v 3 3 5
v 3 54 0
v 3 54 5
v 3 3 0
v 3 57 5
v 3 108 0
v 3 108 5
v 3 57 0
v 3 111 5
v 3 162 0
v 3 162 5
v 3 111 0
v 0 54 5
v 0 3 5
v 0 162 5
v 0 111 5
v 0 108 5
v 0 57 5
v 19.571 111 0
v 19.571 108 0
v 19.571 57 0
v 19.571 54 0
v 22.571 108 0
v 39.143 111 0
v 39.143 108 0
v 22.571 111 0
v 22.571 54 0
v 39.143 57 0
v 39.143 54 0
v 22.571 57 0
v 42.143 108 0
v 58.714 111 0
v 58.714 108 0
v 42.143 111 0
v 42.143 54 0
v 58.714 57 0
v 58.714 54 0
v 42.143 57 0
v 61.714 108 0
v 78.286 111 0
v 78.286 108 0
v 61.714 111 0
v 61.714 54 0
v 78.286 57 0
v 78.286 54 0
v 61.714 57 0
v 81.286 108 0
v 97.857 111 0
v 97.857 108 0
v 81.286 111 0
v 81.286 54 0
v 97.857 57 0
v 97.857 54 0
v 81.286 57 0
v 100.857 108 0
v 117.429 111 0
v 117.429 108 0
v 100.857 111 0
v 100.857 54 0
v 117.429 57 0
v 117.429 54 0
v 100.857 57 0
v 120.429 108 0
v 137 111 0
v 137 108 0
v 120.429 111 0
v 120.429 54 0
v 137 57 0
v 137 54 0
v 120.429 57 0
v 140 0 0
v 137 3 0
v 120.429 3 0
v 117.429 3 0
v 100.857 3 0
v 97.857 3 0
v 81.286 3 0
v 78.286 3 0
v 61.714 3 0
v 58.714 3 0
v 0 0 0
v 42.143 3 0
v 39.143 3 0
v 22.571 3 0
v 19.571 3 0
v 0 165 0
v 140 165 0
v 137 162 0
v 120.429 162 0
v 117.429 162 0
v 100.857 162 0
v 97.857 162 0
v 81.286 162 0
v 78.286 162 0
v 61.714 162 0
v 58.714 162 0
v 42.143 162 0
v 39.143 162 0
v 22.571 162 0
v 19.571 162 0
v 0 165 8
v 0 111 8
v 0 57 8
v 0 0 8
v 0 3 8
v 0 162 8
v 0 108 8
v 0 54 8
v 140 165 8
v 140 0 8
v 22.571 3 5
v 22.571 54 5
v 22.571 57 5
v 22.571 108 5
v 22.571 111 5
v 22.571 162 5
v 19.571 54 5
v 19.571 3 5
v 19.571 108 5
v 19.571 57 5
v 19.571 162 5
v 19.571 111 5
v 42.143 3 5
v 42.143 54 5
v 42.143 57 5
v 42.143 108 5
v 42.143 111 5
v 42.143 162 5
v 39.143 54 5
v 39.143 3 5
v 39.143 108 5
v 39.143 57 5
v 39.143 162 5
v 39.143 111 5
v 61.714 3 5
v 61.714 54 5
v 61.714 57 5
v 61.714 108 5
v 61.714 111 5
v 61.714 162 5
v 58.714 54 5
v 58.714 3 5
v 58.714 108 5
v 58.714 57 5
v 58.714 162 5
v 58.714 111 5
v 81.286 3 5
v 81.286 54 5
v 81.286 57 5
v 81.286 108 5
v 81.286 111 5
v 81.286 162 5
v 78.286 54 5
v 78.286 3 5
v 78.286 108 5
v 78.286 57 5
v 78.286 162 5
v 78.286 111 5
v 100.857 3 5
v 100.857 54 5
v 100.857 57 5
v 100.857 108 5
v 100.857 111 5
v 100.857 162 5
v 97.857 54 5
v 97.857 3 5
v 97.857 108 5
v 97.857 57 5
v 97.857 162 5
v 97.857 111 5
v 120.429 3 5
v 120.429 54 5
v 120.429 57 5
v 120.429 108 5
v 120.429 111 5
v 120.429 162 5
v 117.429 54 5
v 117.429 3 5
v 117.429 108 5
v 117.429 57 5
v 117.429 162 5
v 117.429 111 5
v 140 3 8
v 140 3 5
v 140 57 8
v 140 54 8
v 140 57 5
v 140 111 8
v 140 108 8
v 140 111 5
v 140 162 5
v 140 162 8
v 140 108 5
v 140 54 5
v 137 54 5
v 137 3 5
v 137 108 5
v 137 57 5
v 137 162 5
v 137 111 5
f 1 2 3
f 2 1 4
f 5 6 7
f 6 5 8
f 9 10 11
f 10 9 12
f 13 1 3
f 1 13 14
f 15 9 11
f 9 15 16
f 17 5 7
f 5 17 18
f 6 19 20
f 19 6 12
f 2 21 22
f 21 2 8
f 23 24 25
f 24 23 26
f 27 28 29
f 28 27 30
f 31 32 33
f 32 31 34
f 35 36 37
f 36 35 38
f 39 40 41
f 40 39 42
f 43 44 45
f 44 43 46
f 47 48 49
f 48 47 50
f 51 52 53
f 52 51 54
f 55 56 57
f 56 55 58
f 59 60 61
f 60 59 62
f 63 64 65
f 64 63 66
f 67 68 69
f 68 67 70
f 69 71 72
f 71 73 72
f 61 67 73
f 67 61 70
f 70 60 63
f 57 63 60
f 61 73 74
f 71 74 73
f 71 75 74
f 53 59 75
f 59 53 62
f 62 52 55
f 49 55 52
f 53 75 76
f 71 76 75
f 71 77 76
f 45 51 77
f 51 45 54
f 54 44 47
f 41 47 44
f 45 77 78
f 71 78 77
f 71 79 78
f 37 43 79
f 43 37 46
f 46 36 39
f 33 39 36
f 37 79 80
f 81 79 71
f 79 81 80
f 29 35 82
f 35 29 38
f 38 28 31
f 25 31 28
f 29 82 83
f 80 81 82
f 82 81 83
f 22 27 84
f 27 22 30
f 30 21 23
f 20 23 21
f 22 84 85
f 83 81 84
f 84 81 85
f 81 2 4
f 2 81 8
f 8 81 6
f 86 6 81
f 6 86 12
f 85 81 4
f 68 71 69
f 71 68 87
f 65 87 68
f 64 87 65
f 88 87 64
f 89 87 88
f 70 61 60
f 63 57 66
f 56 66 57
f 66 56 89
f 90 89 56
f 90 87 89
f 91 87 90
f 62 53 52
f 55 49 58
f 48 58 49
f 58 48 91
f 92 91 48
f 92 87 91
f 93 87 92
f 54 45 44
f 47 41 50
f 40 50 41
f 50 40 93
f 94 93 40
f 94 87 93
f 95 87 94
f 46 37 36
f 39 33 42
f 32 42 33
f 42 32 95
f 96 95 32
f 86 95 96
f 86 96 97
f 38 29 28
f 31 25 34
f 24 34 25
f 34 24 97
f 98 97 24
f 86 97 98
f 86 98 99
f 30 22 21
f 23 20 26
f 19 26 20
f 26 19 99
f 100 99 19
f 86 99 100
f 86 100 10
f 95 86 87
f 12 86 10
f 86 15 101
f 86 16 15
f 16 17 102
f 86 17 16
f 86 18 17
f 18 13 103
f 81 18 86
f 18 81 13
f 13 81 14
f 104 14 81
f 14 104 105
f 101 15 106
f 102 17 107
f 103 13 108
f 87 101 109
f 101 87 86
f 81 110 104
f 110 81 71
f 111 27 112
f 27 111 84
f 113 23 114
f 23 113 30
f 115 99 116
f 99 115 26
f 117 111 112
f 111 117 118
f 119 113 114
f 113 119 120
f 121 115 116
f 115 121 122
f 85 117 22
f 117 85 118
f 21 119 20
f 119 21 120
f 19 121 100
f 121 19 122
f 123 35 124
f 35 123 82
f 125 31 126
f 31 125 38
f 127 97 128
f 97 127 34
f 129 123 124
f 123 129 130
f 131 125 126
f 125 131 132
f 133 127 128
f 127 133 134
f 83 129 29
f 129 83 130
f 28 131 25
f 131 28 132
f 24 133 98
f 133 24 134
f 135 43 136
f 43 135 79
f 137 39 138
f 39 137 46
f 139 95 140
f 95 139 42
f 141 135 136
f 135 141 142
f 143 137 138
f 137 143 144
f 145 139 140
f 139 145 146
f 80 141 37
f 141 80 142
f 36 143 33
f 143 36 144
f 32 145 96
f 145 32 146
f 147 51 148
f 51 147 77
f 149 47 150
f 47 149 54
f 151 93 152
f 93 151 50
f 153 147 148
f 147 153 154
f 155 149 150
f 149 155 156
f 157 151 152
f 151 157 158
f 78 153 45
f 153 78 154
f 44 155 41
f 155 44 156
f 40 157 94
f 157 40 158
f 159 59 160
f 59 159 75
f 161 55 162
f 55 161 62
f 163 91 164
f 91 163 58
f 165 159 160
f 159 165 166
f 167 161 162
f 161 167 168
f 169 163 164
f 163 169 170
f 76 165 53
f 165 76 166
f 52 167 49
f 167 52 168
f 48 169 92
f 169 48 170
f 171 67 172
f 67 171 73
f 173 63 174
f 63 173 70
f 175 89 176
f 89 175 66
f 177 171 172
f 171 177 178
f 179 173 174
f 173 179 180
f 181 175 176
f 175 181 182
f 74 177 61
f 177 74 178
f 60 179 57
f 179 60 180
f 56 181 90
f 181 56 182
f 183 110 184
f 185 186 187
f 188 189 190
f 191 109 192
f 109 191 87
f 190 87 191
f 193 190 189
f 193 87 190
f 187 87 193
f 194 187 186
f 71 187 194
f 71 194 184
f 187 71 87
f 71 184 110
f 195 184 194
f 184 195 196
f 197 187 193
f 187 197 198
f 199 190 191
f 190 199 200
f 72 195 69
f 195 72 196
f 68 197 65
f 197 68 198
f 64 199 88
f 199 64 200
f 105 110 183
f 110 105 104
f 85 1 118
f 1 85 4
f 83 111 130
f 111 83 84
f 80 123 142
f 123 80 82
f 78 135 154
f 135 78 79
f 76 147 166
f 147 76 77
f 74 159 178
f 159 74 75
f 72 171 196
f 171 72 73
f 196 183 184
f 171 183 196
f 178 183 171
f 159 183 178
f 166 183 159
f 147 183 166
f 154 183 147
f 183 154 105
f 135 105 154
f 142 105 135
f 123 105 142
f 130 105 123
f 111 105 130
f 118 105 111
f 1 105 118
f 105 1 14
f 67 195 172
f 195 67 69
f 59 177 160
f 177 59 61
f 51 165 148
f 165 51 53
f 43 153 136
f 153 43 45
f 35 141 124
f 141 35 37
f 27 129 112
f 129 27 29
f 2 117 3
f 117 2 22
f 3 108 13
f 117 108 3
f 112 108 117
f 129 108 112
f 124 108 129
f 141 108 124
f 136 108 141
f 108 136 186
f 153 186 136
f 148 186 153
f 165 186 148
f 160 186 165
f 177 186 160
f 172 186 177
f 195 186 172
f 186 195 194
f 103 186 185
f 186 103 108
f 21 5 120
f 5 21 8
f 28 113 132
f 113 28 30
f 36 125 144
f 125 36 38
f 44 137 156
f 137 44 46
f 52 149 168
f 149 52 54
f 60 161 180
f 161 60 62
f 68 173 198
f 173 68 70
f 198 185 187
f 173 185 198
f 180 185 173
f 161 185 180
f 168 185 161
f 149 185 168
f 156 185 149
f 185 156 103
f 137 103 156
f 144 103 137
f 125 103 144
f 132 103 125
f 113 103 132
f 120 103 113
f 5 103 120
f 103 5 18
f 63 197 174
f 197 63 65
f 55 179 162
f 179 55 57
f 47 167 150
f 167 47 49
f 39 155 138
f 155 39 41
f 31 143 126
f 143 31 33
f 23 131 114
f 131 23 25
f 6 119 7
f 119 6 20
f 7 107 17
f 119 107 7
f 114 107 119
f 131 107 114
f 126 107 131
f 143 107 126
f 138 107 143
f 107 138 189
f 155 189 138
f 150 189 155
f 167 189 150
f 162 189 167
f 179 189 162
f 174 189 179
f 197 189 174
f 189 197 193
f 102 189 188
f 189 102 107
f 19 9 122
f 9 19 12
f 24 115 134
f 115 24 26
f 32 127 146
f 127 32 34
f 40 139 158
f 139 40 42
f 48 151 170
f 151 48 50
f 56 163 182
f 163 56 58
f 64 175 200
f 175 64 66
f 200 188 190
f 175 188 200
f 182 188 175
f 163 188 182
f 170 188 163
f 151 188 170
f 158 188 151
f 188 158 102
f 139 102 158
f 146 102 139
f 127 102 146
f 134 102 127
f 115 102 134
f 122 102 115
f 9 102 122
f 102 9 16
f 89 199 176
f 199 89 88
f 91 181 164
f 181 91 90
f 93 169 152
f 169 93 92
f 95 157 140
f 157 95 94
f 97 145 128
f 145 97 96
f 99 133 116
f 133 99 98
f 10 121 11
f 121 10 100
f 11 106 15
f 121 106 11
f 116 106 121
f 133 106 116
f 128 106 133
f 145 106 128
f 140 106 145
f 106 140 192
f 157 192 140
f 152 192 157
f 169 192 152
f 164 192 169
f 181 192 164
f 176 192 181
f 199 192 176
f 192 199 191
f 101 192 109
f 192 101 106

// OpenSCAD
// Short shelf/rack thing (keeps veggies out of standing water from our annoying fridge internal leaking)

module grid(lenx=140, nx=8, leny=165, ny=4) {
  width = 3;
  height = 5;
  
  for (i = [0 : nx - 1]) {
    translate([(lenx - width) * i / (nx - 1), 0, 0])
      cube([width, leny, height]);
  }
  
  for (i = [0 : ny - 1]) {
    translate([0, width + (leny - width) * i / (ny - 1), 0])
      rotate([0, 0, -90])
        cube([width, lenx, height+3]);
  }
}

grid();
